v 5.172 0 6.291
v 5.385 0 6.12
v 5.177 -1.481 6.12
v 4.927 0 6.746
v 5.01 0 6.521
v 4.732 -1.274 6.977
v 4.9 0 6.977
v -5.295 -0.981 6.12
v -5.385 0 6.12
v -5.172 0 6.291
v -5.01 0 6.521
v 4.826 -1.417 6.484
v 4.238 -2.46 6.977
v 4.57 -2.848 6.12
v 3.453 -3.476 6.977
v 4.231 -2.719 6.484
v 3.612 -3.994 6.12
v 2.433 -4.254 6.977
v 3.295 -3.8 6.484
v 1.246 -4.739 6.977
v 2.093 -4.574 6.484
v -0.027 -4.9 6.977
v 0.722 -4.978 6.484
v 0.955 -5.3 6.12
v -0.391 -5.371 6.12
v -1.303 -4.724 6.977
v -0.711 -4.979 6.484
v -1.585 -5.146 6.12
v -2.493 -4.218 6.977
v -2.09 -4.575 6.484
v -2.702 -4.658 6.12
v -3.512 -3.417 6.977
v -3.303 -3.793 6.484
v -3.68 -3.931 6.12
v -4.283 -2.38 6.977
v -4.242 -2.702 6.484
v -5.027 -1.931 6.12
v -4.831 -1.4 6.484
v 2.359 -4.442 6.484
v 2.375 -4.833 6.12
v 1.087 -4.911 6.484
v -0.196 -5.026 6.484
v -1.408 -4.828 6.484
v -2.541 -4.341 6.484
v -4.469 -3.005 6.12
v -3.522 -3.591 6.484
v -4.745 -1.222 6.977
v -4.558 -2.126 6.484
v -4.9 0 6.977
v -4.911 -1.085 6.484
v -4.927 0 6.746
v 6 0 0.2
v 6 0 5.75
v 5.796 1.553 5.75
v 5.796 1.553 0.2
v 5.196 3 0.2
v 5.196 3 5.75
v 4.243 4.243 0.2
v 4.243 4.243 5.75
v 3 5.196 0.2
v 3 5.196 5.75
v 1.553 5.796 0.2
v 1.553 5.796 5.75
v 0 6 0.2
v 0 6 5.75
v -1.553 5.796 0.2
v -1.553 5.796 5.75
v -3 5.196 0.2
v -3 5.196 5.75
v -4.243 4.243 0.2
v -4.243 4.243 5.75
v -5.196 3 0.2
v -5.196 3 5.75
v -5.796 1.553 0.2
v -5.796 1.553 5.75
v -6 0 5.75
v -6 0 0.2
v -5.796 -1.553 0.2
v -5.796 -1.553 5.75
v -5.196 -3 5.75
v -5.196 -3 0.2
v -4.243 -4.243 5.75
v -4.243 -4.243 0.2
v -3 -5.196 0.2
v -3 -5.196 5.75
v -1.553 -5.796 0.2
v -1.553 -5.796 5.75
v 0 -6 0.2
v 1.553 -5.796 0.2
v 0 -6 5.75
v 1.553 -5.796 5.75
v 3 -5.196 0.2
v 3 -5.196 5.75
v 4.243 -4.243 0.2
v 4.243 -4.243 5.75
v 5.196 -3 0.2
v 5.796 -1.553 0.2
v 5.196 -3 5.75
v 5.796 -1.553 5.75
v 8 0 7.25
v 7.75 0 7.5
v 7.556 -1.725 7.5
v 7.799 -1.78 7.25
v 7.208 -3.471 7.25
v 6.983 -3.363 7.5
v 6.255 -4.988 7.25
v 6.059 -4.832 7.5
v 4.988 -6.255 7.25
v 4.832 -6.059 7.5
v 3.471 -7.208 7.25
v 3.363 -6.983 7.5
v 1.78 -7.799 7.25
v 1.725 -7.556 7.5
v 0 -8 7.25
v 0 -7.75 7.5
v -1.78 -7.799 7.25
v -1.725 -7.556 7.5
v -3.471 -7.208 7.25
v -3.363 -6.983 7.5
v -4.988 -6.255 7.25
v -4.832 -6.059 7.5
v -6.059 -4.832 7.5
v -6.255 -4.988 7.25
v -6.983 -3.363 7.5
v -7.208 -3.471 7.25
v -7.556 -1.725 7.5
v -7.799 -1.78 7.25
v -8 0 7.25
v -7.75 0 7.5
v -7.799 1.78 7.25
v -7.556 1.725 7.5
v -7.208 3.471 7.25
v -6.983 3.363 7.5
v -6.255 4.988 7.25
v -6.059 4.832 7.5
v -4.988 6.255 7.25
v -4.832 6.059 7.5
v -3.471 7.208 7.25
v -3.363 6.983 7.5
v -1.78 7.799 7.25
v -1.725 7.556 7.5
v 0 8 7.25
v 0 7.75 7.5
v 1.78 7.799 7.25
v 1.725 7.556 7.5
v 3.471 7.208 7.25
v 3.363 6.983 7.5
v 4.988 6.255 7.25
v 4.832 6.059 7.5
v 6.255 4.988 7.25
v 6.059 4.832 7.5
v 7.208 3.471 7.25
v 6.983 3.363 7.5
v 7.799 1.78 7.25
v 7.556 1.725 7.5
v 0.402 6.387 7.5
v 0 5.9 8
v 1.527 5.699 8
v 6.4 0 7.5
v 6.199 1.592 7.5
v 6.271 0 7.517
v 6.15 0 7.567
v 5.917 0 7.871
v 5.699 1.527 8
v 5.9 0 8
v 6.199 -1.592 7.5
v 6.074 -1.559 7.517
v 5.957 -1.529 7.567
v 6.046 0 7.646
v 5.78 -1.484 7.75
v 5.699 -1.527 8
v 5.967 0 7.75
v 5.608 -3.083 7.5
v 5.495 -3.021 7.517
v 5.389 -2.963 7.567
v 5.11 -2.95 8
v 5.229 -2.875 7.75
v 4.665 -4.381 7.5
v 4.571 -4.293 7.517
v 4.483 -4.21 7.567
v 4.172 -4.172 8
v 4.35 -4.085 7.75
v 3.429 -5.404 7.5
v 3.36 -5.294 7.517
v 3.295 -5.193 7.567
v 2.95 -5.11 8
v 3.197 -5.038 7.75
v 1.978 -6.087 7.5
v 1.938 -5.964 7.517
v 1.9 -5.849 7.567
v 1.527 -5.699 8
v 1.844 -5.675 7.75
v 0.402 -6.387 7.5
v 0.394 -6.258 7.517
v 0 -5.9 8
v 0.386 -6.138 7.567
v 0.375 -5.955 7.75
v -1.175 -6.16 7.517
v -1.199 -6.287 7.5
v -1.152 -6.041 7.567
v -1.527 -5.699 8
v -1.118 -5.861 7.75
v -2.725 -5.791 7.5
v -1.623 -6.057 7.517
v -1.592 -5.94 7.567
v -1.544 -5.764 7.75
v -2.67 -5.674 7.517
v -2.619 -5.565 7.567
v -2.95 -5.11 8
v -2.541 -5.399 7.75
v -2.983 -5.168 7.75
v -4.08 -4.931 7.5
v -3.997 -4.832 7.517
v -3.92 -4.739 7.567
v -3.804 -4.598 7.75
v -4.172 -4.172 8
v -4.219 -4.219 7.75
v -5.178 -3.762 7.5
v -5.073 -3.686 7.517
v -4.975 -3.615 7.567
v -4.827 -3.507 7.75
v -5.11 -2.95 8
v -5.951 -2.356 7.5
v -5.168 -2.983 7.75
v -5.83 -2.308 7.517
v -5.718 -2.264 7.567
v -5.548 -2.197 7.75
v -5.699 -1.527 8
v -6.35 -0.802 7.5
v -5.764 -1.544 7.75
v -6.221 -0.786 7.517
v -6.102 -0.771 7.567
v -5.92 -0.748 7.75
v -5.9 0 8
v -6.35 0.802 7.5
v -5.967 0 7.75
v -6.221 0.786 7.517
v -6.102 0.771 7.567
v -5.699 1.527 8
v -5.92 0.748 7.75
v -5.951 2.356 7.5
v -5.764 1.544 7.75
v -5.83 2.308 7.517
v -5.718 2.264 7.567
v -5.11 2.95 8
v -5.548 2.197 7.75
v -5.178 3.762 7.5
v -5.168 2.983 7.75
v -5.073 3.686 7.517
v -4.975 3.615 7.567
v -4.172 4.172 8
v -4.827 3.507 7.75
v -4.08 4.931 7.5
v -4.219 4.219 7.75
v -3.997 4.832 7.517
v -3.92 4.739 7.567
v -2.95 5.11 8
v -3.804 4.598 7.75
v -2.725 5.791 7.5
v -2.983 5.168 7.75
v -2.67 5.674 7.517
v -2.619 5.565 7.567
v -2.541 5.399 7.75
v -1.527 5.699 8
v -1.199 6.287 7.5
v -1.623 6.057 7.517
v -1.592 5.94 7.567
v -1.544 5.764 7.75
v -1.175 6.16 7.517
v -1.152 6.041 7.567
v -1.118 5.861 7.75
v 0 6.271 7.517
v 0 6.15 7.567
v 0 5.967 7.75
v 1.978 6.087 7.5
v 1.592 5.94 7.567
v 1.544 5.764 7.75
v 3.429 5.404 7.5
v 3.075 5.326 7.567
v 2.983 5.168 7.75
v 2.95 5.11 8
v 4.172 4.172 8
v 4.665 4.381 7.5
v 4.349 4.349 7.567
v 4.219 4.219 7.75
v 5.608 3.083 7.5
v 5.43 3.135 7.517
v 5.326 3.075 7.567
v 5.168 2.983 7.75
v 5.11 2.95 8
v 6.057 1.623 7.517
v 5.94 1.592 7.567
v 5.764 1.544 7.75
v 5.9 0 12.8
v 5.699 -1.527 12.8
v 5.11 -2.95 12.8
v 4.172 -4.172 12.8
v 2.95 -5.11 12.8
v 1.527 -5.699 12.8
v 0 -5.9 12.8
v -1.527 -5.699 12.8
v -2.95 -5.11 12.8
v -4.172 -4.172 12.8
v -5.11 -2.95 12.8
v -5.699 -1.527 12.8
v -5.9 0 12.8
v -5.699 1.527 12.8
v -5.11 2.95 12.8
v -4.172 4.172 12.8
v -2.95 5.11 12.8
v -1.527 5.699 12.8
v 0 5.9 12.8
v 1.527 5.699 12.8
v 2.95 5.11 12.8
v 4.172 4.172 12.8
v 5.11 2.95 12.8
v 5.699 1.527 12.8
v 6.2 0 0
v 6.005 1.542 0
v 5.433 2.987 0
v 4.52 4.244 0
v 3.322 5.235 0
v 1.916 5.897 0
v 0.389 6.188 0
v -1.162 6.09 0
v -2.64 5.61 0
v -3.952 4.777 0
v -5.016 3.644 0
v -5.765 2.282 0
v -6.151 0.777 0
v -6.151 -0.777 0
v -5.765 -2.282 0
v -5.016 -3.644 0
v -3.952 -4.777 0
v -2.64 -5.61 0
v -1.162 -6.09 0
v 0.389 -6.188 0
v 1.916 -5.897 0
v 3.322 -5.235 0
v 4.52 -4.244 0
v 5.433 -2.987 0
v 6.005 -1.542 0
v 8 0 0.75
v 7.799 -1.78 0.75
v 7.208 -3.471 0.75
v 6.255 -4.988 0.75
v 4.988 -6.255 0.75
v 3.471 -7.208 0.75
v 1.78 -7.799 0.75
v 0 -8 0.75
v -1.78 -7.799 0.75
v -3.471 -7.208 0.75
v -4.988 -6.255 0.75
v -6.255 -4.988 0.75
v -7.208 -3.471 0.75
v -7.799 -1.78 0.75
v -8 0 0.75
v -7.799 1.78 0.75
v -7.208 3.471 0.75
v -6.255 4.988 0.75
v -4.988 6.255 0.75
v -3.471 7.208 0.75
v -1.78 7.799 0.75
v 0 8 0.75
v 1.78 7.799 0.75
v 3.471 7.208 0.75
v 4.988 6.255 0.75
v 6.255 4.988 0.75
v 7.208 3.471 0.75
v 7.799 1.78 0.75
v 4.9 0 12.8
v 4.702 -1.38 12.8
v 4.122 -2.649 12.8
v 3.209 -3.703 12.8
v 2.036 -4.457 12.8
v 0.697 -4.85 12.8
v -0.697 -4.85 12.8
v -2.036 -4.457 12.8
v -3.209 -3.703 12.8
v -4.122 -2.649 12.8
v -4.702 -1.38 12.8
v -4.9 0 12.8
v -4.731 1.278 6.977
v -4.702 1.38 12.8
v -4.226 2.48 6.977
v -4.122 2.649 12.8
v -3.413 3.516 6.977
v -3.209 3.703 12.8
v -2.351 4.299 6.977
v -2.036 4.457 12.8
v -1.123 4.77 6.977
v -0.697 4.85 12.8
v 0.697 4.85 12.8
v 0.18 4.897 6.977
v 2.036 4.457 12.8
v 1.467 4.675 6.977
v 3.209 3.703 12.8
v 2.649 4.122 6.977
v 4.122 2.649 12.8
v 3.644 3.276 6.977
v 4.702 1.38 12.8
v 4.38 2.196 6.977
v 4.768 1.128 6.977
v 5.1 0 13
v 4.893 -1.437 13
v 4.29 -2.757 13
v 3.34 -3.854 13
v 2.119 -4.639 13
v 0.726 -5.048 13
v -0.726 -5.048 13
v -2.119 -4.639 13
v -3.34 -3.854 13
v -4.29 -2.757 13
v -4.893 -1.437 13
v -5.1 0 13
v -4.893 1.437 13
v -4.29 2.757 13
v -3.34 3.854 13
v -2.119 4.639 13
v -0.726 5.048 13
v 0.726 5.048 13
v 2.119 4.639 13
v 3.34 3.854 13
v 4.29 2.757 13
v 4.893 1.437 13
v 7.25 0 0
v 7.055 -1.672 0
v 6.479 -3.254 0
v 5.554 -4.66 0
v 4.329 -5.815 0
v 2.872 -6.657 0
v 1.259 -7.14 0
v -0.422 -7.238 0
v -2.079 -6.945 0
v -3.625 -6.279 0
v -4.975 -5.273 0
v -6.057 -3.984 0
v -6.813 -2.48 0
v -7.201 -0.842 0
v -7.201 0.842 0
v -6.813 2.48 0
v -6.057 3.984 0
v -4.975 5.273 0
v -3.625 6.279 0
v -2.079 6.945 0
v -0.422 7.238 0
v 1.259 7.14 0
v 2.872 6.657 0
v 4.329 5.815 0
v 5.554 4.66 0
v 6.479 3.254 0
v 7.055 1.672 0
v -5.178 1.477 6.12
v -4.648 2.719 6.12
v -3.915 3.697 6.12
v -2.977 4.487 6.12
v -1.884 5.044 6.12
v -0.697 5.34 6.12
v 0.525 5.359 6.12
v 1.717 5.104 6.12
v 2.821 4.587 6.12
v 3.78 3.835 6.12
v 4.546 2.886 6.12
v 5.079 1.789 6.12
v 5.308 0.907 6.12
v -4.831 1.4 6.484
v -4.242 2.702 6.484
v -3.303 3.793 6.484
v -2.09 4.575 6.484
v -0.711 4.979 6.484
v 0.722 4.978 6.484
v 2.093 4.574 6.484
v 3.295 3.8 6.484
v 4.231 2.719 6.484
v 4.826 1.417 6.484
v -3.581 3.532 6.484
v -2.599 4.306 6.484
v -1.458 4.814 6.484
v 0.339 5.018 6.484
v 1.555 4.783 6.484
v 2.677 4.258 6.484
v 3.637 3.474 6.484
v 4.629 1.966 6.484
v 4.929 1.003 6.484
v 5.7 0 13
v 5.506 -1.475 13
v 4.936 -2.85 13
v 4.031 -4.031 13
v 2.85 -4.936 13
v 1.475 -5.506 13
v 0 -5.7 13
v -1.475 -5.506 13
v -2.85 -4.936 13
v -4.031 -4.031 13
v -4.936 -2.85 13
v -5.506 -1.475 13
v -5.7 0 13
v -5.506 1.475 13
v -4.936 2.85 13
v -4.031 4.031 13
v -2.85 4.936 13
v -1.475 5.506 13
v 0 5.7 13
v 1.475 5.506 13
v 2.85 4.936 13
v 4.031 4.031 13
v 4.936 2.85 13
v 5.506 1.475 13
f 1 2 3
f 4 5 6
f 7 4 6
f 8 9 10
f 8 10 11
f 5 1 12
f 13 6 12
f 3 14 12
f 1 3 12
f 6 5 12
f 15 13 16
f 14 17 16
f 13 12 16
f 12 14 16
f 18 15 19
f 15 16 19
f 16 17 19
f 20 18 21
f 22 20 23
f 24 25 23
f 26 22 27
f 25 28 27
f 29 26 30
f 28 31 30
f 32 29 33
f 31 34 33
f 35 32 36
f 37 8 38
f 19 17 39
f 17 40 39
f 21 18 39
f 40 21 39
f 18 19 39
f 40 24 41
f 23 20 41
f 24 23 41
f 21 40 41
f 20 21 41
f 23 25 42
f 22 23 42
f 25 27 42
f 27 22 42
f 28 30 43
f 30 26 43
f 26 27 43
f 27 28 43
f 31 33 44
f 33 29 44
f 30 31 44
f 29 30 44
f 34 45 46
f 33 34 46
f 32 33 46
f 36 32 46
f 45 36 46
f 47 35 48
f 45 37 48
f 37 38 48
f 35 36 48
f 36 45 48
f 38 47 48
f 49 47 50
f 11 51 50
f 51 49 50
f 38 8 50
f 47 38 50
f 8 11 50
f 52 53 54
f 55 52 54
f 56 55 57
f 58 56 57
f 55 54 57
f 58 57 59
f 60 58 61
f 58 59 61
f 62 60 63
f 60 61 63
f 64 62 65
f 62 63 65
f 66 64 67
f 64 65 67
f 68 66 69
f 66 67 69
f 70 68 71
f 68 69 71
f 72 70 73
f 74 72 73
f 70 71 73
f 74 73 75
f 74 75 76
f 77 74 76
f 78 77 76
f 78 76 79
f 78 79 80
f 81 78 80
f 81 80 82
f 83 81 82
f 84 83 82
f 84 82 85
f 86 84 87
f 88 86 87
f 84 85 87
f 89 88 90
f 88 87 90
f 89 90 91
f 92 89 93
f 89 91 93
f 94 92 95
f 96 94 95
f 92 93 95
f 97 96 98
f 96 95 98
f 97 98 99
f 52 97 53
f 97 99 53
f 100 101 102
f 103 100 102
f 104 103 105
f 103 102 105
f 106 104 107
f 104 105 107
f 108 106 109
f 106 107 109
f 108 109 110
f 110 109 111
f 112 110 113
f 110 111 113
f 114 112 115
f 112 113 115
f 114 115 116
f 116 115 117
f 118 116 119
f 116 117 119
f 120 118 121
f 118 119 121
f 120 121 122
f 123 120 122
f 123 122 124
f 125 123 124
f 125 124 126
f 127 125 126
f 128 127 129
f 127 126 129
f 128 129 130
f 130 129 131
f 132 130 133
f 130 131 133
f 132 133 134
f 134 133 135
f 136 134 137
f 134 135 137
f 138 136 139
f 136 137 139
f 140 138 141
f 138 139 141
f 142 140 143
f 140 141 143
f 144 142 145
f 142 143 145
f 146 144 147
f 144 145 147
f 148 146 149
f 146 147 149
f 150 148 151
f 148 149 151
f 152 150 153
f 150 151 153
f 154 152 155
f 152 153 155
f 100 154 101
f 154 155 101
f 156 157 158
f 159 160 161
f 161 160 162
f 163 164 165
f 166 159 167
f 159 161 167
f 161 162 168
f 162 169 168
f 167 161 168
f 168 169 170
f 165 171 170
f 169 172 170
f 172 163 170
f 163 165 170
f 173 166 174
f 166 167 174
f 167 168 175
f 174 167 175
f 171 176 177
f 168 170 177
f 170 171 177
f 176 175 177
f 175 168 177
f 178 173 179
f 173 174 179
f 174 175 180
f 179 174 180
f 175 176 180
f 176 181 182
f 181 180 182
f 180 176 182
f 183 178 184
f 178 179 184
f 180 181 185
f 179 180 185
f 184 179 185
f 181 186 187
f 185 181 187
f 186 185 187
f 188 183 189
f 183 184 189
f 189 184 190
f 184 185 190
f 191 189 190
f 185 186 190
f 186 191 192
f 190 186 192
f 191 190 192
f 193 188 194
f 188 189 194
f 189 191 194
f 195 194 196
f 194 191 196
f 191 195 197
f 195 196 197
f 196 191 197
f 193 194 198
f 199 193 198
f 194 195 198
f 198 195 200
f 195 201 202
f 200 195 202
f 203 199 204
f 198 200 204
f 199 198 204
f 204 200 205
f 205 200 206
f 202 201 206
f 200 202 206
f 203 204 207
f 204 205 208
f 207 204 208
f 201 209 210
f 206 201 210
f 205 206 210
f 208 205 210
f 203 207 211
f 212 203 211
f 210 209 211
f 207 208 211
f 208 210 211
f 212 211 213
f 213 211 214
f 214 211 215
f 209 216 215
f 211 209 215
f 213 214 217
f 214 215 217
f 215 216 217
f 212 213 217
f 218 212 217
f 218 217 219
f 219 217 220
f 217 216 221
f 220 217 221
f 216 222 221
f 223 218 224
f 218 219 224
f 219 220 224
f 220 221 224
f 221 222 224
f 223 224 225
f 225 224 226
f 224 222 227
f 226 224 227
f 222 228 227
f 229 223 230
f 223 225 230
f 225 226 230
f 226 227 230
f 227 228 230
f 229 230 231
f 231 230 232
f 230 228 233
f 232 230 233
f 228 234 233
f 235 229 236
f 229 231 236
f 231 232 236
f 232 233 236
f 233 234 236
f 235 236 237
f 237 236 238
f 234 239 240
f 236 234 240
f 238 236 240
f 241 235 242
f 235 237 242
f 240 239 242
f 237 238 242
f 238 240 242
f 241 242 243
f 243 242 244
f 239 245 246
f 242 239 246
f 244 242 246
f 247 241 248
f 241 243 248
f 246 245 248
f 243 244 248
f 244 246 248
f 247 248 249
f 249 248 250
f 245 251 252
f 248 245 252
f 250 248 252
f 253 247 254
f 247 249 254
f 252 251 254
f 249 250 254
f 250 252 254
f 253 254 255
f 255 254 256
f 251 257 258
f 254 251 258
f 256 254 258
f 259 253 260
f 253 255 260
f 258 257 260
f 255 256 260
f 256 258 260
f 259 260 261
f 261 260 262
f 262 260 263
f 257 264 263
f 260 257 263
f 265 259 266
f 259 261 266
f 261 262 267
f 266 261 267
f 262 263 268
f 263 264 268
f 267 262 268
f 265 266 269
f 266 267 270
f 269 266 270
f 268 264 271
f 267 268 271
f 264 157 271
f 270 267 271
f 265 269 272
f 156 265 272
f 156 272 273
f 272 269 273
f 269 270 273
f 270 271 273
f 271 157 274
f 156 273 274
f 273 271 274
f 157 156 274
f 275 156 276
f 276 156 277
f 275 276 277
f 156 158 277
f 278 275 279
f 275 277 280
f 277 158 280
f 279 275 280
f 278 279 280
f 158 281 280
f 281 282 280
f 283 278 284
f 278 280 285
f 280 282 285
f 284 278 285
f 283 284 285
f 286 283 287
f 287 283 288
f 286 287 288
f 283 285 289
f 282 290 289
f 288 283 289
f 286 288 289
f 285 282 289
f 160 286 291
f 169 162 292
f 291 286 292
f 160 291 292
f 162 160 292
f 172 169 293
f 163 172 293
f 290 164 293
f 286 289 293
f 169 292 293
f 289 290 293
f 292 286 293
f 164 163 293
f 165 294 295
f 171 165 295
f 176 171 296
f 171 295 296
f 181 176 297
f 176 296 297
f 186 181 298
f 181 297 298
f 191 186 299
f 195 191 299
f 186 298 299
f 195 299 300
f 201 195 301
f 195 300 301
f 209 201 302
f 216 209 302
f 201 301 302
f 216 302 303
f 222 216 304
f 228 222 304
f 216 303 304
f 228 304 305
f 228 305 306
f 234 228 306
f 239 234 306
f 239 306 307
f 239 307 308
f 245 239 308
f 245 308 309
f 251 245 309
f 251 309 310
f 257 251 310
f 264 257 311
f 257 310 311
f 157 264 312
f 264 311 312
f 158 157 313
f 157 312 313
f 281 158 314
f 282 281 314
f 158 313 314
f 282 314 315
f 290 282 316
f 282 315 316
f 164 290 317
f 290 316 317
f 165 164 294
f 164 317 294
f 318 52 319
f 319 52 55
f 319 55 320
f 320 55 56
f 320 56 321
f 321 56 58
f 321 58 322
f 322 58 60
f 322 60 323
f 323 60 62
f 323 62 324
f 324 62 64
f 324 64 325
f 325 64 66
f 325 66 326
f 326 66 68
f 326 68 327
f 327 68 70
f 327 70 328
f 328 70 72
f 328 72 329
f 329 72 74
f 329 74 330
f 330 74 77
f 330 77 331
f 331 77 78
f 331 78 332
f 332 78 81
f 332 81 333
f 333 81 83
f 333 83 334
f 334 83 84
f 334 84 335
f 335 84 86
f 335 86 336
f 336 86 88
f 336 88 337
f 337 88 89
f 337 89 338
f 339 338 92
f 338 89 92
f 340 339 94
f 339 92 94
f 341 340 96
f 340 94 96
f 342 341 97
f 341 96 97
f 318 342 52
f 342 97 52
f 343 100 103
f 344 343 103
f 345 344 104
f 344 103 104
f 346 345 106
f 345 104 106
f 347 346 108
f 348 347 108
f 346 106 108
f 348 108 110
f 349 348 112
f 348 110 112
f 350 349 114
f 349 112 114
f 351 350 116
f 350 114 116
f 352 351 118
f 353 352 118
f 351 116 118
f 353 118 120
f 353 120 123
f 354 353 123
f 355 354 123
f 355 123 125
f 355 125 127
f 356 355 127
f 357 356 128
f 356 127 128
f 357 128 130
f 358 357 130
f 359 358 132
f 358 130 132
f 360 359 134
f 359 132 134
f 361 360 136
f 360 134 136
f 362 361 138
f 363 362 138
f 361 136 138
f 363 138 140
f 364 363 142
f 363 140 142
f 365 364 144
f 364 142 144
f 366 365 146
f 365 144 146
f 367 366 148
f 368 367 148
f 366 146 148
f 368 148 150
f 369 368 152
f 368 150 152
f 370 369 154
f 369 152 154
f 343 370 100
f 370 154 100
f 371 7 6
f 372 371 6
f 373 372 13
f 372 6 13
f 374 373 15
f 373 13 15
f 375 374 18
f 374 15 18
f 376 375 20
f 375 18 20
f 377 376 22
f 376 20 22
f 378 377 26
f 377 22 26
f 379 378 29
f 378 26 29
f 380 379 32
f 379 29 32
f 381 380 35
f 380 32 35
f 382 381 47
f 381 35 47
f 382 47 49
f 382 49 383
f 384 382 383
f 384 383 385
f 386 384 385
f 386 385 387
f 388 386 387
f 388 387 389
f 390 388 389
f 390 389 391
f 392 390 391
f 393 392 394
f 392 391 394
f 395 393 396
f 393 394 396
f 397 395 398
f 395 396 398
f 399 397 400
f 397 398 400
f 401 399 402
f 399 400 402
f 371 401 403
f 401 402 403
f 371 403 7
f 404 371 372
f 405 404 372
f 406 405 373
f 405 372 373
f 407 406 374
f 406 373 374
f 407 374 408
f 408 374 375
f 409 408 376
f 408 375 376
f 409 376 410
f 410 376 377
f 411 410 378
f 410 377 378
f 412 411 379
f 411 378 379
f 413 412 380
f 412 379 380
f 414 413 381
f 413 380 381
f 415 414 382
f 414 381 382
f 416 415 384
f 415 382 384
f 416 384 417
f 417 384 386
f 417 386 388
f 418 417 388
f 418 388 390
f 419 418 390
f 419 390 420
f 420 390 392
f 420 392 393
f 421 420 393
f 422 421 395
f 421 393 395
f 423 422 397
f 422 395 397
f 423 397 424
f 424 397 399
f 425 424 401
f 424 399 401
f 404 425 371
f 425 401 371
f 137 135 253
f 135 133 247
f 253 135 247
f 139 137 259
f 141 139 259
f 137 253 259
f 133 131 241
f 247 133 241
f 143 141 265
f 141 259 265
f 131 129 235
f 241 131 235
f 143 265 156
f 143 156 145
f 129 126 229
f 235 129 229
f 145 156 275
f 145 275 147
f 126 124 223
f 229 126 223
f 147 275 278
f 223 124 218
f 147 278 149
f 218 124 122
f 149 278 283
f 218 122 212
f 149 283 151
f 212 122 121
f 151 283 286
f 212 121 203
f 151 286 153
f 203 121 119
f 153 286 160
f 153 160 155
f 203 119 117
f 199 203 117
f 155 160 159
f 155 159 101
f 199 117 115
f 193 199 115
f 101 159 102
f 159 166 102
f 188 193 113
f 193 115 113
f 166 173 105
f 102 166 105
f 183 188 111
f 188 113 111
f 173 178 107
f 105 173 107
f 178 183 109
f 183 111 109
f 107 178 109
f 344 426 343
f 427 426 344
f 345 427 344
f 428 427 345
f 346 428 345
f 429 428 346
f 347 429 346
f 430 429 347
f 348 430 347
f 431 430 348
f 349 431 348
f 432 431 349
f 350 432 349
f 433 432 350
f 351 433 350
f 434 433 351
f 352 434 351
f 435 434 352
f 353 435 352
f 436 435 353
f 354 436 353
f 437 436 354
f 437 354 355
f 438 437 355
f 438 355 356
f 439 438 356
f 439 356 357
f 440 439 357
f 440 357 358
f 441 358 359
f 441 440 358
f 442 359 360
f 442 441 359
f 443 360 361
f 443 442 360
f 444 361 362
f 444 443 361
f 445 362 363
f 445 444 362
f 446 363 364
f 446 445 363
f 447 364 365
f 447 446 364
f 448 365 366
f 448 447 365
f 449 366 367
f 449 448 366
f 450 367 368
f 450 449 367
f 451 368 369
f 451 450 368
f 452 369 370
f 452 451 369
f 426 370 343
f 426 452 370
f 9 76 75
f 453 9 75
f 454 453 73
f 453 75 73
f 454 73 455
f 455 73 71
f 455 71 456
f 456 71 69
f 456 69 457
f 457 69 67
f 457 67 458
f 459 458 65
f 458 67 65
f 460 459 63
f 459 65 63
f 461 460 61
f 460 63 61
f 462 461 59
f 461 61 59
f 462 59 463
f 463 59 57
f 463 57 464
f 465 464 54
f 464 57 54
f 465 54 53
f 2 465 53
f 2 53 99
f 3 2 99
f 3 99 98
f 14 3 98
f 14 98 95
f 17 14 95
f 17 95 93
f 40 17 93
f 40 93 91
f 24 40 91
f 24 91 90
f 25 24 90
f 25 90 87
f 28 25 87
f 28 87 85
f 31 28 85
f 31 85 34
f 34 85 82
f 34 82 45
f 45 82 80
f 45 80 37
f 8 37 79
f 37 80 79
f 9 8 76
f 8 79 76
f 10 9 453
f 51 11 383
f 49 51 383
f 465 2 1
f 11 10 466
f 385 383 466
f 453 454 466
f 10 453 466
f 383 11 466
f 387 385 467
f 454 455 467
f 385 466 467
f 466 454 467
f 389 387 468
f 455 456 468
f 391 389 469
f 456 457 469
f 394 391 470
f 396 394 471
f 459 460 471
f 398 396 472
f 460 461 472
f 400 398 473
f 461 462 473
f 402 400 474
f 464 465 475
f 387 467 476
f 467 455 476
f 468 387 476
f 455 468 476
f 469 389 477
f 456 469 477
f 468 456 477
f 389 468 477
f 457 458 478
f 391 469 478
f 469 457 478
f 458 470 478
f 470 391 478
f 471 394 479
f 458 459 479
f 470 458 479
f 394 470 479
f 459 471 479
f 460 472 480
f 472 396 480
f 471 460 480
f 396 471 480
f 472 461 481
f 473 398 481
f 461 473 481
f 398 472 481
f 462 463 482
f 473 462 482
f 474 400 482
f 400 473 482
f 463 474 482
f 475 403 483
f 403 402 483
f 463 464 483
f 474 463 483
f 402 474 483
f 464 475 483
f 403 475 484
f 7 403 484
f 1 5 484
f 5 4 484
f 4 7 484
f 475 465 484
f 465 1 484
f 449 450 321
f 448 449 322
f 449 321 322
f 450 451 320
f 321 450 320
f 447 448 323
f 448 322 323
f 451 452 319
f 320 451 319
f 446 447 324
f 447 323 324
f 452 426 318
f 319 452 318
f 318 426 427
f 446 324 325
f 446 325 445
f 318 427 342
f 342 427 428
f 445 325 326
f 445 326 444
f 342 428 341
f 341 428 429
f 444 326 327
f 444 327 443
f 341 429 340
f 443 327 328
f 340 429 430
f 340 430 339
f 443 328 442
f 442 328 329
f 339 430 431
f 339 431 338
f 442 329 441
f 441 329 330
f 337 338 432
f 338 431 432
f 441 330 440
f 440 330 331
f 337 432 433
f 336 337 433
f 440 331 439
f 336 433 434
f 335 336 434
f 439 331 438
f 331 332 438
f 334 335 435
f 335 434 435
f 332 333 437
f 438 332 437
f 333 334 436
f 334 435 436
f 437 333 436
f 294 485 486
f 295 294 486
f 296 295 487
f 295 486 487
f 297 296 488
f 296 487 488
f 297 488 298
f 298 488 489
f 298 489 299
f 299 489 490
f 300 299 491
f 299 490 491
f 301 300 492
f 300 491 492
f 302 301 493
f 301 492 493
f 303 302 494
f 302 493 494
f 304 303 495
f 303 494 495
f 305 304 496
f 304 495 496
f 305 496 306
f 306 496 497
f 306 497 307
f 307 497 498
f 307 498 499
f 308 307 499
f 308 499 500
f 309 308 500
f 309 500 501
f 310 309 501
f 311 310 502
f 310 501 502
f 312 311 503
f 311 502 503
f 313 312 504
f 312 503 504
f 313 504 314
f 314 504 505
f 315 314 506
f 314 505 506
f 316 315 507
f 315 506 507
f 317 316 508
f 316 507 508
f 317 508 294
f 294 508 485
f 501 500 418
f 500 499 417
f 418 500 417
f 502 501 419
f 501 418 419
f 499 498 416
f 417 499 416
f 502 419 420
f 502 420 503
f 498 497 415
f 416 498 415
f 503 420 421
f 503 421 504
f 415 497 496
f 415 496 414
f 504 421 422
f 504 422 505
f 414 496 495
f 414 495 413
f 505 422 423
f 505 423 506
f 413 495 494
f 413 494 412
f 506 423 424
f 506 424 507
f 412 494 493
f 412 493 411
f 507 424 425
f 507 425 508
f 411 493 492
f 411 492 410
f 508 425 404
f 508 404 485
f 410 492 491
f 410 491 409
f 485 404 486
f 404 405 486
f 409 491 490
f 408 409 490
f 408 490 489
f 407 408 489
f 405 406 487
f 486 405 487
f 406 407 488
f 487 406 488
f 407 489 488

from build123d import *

# Parameters (mm, degrees)
F_12_0_12_DIAMETER_HOLE1_D     = 12
F_12_0_12_DIAMETER_HOLE1_DEPTH = 5.75
F_12_0_12_DIAMETER_HOLE1_TIP   = 3.605163714
CHAMFER1_SIZE                  = 0.75
CHAMFER2_SIZE                  = 0.25
CHAMFER3_SIZE                  = 0.2
FILLET1_R                      = 1


with BuildPart() as part:
    # Sketch1 → Revolve1 (revolve)
    with BuildSketch(Plane.XZ):
        with BuildLine():
            Line((5.9, 13), (4.9, 13))
            Line((4.9, 13), (4.9, 5.75))
            Line((4.9, 5.75), (0, 5.75))
            Line((0, 5.75), (0, 0))
            Line((0, 0), (8, 0))
            Line((8, 0), (8, 7.5))
            Line((8, 7.5), (6.4, 7.5))
            ThreePointArc((6.4, 7.5), (6.046446609, 7.646446609), (5.9, 8))
            Line((5.9, 8), (5.9, 13))
        make_face()
    revolve(axis=Axis((0, 0, 13), (0, 0, -1)))

    # Ø12.0 (12) Diameter Hole1
    with Locations(Plane(origin=(0, 0, 0), x_dir=(-1, 0, 0), z_dir=(0, 0, -1))):
        with Locations((0, 0)):
            Hole(F_12_0_12_DIAMETER_HOLE1_D / 2, depth=F_12_0_12_DIAMETER_HOLE1_DEPTH)
            with Locations((0, 0, -(F_12_0_12_DIAMETER_HOLE1_DEPTH + F_12_0_12_DIAMETER_HOLE1_TIP / 2))):  # 118° drill point
                Cone(0, F_12_0_12_DIAMETER_HOLE1_D / 2, F_12_0_12_DIAMETER_HOLE1_TIP, mode=Mode.SUBTRACT)

    # Chamfer1
    chamfer1_edges = [part.edges().sort_by_distance(p)[0] for p in [
        (-8, 0, 0),
    ]]
    chamfer(chamfer1_edges, length=CHAMFER1_SIZE)

    # Chamfer2
    chamfer2_edges = [part.edges().sort_by_distance(p)[0] for p in [
        (-8, 0, 7.5),
    ]]
    chamfer(chamfer2_edges, length=CHAMFER2_SIZE)

    # Chamfer3
    chamfer3_edges = [part.edges().sort_by_distance(p)[0] for p in [
        (-6, 0, 0),
        (-5.9, 0, 13),
        (-4.9, 0, 13),
    ]]
    chamfer(chamfer3_edges, length=CHAMFER3_SIZE)

    # Fillet1
    fillet1_edges = [part.edges().sort_by_distance(p)[0] for p in [
        (0, -4.9, 6.410946681),
    ]]
    fillet(fillet1_edges, radius=FILLET1_R)


solid = part.part
